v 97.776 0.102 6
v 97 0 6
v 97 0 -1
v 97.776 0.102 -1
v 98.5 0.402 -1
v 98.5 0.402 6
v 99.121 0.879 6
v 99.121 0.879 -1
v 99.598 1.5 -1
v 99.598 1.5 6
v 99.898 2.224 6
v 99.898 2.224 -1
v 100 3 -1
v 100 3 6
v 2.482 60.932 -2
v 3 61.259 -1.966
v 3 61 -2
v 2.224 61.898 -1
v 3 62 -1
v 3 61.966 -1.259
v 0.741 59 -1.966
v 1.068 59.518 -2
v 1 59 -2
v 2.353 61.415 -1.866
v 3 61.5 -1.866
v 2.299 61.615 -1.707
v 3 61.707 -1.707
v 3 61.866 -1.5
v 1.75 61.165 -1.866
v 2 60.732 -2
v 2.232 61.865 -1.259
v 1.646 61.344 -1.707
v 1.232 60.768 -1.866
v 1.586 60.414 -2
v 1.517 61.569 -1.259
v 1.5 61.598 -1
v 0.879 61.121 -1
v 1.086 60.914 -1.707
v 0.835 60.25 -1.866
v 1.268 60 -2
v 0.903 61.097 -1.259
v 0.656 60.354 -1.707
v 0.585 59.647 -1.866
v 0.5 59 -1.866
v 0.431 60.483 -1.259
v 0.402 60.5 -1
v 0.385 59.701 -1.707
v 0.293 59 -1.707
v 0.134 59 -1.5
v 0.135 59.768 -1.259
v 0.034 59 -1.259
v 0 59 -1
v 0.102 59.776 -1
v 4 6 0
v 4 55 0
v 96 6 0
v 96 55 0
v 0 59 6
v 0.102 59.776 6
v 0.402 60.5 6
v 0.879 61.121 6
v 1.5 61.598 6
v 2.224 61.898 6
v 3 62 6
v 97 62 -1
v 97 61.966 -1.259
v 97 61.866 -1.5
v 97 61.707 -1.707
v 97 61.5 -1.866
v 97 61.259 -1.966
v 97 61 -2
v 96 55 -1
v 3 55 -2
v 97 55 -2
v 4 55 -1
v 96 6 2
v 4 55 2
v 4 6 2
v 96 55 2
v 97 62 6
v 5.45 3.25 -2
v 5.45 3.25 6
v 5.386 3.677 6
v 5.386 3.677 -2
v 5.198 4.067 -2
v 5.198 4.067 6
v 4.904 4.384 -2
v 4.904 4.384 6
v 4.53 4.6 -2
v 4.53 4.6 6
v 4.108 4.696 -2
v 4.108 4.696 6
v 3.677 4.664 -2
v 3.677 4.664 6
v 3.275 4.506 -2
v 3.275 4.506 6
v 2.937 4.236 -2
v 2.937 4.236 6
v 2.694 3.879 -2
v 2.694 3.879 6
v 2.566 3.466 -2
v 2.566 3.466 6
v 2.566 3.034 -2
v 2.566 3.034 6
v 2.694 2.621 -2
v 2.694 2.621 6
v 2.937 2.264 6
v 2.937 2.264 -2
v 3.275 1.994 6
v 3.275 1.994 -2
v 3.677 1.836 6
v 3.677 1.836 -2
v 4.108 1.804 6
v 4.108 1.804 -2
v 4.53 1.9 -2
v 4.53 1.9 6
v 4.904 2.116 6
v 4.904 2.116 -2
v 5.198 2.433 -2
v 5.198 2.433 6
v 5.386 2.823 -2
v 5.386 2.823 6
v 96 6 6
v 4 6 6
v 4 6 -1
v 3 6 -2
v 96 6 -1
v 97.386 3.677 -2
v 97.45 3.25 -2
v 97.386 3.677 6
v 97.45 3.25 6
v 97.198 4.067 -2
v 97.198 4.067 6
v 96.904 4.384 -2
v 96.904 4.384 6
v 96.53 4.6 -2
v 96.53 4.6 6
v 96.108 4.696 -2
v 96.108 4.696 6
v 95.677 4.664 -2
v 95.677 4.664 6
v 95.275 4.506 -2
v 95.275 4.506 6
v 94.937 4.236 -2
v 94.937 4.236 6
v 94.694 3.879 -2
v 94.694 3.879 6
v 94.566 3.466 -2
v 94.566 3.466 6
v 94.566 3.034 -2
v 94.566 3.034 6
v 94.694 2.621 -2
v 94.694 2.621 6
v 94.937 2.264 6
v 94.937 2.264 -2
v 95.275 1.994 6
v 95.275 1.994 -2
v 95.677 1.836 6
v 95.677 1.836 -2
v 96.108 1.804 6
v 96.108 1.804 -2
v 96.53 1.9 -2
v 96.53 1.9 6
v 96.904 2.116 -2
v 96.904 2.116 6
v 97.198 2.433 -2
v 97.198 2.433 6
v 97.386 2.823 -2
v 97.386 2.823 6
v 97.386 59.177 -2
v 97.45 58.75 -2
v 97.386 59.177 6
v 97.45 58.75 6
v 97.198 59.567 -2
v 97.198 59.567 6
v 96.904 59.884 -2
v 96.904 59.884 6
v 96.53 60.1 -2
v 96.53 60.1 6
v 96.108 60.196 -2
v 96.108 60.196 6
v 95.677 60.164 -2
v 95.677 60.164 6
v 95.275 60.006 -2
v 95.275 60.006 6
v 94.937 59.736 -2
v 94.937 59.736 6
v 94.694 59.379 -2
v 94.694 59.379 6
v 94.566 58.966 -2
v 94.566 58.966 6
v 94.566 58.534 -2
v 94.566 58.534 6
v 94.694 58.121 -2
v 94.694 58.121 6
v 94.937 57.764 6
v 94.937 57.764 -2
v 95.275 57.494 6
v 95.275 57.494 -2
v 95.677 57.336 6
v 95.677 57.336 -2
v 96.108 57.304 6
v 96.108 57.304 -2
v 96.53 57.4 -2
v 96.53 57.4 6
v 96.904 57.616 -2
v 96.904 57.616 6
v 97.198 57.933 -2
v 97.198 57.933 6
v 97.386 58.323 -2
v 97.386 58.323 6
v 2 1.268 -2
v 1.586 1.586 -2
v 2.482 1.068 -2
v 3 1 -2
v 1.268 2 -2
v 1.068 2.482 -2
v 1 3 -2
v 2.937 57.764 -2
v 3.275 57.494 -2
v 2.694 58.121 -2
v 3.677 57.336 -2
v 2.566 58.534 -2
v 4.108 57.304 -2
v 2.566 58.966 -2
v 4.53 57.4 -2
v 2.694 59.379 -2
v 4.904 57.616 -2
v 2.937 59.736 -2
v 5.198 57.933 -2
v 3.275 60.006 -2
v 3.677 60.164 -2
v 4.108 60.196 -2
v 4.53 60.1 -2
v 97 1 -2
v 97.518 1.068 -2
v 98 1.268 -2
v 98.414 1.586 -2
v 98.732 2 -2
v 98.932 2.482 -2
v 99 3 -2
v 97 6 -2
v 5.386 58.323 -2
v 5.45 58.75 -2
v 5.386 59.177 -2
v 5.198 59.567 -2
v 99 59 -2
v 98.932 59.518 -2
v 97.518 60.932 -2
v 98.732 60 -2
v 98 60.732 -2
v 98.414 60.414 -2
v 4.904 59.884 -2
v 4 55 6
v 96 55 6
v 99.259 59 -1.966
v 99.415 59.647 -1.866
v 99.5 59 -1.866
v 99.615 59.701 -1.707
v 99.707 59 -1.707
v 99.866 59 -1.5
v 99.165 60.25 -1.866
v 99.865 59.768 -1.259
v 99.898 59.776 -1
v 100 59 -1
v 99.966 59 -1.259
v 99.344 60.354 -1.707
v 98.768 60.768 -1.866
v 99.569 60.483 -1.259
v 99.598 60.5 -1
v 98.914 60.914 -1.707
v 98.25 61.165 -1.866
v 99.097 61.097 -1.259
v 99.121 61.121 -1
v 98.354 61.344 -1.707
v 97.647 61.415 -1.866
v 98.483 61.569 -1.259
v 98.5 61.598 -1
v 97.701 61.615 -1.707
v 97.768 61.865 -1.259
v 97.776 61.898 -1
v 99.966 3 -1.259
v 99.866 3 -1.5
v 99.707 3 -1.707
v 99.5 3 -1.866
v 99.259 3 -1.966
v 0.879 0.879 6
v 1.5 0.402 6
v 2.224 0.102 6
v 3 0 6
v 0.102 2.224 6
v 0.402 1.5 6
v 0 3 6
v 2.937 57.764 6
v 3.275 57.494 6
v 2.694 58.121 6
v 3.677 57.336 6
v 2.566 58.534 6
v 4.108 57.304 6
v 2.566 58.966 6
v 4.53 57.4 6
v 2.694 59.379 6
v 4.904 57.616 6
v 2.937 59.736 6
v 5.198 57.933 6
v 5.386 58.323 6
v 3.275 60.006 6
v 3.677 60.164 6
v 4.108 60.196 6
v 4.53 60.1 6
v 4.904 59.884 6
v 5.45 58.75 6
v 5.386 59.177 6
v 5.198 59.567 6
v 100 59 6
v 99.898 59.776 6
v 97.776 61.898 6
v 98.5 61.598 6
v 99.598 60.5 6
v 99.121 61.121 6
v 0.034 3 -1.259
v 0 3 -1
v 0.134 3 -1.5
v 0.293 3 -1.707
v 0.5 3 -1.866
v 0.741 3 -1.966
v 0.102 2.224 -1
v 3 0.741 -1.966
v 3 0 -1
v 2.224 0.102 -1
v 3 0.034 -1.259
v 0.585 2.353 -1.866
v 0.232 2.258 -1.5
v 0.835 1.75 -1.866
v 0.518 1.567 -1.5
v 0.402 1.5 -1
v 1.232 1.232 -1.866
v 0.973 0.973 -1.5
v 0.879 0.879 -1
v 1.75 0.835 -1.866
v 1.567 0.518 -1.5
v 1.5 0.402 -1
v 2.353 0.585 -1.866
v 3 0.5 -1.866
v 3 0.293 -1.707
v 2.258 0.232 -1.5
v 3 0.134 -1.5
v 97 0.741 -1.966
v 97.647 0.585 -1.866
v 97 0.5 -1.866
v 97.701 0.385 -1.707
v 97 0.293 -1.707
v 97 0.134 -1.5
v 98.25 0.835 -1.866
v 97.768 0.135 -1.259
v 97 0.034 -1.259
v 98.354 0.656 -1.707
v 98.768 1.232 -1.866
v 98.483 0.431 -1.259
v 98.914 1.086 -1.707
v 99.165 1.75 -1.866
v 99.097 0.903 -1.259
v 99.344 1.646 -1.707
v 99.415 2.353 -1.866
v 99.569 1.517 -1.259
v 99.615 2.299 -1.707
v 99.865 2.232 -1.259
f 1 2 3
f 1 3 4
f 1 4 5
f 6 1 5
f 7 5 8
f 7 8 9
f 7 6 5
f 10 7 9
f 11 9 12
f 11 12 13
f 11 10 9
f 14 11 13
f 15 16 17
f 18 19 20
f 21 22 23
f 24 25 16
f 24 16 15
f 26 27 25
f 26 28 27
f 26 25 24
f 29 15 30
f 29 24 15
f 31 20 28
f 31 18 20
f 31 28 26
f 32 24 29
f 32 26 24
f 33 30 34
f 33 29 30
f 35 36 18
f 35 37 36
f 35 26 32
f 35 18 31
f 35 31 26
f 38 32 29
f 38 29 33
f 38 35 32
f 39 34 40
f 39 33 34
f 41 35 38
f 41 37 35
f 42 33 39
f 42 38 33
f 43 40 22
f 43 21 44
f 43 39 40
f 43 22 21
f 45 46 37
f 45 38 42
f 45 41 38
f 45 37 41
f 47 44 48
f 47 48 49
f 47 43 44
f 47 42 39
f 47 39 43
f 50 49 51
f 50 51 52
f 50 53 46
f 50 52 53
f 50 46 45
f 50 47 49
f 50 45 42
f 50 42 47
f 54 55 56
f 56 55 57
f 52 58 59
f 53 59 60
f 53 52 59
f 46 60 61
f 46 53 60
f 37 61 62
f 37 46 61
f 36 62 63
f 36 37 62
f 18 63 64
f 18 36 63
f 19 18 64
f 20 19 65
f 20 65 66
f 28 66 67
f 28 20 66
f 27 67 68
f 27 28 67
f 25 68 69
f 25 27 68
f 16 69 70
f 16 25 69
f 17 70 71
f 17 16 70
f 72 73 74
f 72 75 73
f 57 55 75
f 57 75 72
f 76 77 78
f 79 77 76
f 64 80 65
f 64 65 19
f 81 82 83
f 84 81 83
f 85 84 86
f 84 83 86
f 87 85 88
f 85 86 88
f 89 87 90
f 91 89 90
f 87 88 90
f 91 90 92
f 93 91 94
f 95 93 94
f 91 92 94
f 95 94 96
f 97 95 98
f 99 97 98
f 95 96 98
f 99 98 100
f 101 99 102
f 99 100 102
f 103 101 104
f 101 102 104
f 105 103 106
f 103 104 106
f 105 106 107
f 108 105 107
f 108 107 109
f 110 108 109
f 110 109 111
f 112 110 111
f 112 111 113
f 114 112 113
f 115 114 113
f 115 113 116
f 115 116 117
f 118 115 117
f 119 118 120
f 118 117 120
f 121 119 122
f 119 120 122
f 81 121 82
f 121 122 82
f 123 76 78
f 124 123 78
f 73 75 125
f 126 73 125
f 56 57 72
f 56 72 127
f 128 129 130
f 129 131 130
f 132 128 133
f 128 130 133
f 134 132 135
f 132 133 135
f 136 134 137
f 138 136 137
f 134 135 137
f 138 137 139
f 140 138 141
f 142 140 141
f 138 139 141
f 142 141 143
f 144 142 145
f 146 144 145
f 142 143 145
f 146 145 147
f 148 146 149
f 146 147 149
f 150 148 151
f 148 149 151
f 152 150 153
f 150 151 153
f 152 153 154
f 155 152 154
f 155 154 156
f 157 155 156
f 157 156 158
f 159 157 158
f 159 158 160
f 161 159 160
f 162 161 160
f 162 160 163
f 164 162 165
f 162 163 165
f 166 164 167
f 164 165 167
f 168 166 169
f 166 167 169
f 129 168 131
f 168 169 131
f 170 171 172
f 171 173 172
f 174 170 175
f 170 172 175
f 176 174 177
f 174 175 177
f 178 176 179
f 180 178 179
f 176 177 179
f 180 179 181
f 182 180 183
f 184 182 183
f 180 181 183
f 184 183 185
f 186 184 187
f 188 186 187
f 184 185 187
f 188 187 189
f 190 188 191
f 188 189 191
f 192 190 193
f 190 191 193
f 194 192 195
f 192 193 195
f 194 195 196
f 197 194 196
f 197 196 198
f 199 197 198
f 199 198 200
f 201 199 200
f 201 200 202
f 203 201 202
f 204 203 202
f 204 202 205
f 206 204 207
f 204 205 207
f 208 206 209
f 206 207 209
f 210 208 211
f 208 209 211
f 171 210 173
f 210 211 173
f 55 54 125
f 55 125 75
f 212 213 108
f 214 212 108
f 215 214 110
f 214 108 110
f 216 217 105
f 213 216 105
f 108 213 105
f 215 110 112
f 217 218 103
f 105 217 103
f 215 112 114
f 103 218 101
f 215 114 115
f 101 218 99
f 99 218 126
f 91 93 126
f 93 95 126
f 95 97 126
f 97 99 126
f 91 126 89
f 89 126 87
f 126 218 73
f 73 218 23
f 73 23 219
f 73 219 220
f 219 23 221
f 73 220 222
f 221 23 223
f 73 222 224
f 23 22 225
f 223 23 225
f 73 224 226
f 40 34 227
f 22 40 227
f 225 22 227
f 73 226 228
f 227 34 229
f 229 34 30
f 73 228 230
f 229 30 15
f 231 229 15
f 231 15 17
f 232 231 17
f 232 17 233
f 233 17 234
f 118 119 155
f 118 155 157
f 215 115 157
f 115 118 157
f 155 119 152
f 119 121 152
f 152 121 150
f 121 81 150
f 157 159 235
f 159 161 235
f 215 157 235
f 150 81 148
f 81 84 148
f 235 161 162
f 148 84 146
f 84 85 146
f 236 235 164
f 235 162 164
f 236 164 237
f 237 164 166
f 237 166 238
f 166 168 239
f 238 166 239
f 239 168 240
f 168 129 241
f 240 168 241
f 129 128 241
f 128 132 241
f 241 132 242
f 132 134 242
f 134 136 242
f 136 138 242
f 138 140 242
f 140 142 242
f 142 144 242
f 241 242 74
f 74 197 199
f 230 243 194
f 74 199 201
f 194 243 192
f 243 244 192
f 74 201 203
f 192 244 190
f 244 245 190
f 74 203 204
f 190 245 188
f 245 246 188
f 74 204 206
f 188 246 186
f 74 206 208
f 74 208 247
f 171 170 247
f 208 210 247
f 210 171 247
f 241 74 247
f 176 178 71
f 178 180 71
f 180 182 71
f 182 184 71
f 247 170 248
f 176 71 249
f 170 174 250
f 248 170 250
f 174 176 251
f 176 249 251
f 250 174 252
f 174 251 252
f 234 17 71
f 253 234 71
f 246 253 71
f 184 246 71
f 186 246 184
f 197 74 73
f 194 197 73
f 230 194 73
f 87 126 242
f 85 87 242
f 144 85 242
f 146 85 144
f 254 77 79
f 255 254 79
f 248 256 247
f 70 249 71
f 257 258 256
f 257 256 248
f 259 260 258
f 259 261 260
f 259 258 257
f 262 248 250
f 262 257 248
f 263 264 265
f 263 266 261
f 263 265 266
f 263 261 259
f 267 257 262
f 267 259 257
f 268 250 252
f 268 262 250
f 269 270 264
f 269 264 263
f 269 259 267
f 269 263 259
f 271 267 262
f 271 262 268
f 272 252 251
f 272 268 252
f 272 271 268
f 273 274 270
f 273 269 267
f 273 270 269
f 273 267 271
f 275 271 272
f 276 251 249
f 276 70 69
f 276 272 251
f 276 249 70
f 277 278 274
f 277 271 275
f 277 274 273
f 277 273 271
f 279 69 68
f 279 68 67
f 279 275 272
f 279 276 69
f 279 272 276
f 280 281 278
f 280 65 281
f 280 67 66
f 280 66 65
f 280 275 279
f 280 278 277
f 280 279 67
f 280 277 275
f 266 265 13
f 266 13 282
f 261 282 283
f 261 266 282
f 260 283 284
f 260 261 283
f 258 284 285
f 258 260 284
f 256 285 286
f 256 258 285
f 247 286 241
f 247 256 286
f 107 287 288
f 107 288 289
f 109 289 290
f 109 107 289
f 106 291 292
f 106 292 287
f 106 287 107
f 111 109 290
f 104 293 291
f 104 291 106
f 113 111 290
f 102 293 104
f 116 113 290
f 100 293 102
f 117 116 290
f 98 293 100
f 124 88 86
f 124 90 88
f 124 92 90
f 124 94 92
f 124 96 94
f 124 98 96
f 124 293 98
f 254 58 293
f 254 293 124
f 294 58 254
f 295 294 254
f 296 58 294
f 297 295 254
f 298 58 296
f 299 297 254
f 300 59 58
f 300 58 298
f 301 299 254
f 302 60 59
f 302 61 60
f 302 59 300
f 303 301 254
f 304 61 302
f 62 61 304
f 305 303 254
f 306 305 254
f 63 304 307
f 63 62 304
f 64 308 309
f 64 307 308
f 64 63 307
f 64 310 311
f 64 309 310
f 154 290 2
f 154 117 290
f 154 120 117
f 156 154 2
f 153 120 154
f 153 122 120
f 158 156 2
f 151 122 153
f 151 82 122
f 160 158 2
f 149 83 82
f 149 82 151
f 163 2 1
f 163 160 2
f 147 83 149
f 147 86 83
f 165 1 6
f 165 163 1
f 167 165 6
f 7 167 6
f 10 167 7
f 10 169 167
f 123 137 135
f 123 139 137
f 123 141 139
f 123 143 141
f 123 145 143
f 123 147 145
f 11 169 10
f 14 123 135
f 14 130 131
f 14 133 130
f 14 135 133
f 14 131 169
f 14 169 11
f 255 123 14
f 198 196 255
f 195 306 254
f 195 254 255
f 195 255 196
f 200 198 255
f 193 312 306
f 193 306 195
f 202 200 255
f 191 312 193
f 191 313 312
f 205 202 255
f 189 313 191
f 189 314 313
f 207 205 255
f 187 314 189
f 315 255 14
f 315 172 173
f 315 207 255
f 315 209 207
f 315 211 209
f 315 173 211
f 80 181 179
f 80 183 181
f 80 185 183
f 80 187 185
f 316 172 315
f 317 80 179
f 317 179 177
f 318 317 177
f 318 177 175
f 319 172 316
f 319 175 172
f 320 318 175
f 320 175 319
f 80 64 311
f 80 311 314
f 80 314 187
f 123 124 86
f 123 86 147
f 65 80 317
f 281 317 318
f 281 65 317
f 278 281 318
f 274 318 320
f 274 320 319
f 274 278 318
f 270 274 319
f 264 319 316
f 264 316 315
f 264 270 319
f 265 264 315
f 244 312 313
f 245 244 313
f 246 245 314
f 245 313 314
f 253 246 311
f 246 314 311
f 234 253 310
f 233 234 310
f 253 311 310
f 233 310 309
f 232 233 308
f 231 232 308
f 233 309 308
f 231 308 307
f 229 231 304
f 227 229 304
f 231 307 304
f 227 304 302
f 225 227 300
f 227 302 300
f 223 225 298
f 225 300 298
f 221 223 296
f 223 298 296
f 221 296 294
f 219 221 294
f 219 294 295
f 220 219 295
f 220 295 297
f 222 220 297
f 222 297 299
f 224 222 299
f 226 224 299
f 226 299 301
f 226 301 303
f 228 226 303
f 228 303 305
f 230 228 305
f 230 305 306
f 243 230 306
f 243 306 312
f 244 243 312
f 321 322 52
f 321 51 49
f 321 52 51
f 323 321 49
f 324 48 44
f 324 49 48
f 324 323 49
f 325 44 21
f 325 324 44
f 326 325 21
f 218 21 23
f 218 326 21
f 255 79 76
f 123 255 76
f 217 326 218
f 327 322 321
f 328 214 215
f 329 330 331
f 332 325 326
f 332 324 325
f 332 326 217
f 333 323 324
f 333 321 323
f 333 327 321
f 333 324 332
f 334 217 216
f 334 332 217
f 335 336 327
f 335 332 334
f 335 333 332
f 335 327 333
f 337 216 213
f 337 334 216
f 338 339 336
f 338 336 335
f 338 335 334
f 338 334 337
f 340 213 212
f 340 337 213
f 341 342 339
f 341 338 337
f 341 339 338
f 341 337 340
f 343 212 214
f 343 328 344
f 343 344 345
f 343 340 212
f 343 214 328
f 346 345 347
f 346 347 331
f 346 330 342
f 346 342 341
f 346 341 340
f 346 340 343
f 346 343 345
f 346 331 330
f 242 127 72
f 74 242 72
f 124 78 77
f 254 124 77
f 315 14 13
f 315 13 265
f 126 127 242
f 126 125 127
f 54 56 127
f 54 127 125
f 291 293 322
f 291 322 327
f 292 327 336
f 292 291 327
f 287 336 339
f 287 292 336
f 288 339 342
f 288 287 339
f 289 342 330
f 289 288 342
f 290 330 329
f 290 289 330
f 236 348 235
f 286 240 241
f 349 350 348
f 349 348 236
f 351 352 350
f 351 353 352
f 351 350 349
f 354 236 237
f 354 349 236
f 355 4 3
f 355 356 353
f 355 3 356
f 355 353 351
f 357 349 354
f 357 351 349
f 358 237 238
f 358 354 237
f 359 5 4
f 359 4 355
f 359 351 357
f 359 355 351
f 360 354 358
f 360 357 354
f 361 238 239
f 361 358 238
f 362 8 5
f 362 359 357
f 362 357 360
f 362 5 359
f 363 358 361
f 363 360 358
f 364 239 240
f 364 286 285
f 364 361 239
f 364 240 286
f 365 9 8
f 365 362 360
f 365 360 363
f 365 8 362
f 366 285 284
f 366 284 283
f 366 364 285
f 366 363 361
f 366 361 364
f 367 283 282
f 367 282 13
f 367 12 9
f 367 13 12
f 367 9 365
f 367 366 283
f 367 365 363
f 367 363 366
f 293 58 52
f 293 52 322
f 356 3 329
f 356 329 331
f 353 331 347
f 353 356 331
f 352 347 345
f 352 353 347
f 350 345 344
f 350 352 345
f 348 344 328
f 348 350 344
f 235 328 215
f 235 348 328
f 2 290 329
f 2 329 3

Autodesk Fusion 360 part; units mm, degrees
sketch "Sketch1" plane through (0, 0, 0) normal (0, 0, 1) x (1, 0, 0)
  line L0 (0, 0) -> (100, 0)
  line L1 (100, 0) -> (100, 62)
  line L2 (100, 62) -> (0, 62)
  line L3 (0, 62) -> (0, 0)
  line L4 (4, 55) -> (96, 55)
  line L5 (96, 55) -> (96, 6)
  line L6 (96, 6) -> (4, 6)
  line L7 (4, 6) -> (4, 55)
  dimension "d1" = 100
  dimension "d2" = 62
  dimension "d3" = 92
  dimension "d4" = 49
  dimension "d5" = 6
  dimension "d6" = 4
extrude "Extrude1" add sketch "Sketch1" along normal blind 2 contours L4 L5 L6 L7
extrude "Extrude2" add sketch "Sketch1" along normal blind 6
sketch "Sketch2" plane through (0, 0, 0) normal (0, 0, 1) x (1, 0, 0)
  line L0 (96, 52) -> (4, 52)
  line L1 (4, 52) -> (4, 10)
  line L2 (4, 10) -> (96, 10)
  line L3 (96, 10) -> (96, 52)
  line L4 (0, 0) -> (100, 0)
  line L5 (100, 0) -> (100, 62)
  dimension "d11" = 92
  dimension "d12" = 42
  dimension "d13" = 10
  dimension "d14" = 4
extrude "Extrude3" add sketch "Sketch1" against normal blind 2
ref_plane "WorkPlane1" through (0, 0, 15) normal (0, 0, 1) x (1, 0, 0)
sketch "Sketch3" plane through (0, 0, 15) normal (0, 0, 1) x (1, 0, 0)
  circle A0 centre (4, 3.25) radius 1.45
  circle A1 centre (96, 3.25) radius 1.45
  circle A2 centre (96, 58.75) radius 1.45
  circle A3 centre (4, 58.75) radius 1.45
  line L0 (0, 62) -> (0, 0)
  line L1 (0, 0) -> (100, 0)
  line L2 (100, 0) -> (100, 62)
  line L3 (100, 62) -> (0, 62)
  dimension "d18" = 2.9
  dimension "d19" = 2.9
  dimension "d20" = 2.9
  dimension "d21" = 2.9
  dimension "d22" = 4
  dimension "d23" = 3.25
  dimension "d24" = 4
  dimension "d25" = 3.25
  dimension "d26" = 4
  dimension "d27" = 3.25
  dimension "d28" = 4
  dimension "d29" = 3.25
extrude "Extrude4" cut sketch "Sketch3" against normal blind 25 contours A0 | A1 | A2 | A3
fillet "Fillet1" radius 3 4 edges at (100, 62, 2) (100, 0, 2) (0, 62, 2) (0, 0, 2)
fillet "Fillet2" radius 1 8 edges at (0.8787, 0.8787, -2) (0, 31, -2) (0.8787, 61.1213, -2) (50, 62, -2) (99.1213, 61.1213, -2) (100, 31, -2) (99.1213, 0.8787, -2) (50, 0, -2)
chamfer "Chamfer1" distance 1 angle 45 1 edges at (96, 30.5, -2)
chamfer "Chamfer2" distance 1 angle 45 1 edges at (4, 30.5, -2)
